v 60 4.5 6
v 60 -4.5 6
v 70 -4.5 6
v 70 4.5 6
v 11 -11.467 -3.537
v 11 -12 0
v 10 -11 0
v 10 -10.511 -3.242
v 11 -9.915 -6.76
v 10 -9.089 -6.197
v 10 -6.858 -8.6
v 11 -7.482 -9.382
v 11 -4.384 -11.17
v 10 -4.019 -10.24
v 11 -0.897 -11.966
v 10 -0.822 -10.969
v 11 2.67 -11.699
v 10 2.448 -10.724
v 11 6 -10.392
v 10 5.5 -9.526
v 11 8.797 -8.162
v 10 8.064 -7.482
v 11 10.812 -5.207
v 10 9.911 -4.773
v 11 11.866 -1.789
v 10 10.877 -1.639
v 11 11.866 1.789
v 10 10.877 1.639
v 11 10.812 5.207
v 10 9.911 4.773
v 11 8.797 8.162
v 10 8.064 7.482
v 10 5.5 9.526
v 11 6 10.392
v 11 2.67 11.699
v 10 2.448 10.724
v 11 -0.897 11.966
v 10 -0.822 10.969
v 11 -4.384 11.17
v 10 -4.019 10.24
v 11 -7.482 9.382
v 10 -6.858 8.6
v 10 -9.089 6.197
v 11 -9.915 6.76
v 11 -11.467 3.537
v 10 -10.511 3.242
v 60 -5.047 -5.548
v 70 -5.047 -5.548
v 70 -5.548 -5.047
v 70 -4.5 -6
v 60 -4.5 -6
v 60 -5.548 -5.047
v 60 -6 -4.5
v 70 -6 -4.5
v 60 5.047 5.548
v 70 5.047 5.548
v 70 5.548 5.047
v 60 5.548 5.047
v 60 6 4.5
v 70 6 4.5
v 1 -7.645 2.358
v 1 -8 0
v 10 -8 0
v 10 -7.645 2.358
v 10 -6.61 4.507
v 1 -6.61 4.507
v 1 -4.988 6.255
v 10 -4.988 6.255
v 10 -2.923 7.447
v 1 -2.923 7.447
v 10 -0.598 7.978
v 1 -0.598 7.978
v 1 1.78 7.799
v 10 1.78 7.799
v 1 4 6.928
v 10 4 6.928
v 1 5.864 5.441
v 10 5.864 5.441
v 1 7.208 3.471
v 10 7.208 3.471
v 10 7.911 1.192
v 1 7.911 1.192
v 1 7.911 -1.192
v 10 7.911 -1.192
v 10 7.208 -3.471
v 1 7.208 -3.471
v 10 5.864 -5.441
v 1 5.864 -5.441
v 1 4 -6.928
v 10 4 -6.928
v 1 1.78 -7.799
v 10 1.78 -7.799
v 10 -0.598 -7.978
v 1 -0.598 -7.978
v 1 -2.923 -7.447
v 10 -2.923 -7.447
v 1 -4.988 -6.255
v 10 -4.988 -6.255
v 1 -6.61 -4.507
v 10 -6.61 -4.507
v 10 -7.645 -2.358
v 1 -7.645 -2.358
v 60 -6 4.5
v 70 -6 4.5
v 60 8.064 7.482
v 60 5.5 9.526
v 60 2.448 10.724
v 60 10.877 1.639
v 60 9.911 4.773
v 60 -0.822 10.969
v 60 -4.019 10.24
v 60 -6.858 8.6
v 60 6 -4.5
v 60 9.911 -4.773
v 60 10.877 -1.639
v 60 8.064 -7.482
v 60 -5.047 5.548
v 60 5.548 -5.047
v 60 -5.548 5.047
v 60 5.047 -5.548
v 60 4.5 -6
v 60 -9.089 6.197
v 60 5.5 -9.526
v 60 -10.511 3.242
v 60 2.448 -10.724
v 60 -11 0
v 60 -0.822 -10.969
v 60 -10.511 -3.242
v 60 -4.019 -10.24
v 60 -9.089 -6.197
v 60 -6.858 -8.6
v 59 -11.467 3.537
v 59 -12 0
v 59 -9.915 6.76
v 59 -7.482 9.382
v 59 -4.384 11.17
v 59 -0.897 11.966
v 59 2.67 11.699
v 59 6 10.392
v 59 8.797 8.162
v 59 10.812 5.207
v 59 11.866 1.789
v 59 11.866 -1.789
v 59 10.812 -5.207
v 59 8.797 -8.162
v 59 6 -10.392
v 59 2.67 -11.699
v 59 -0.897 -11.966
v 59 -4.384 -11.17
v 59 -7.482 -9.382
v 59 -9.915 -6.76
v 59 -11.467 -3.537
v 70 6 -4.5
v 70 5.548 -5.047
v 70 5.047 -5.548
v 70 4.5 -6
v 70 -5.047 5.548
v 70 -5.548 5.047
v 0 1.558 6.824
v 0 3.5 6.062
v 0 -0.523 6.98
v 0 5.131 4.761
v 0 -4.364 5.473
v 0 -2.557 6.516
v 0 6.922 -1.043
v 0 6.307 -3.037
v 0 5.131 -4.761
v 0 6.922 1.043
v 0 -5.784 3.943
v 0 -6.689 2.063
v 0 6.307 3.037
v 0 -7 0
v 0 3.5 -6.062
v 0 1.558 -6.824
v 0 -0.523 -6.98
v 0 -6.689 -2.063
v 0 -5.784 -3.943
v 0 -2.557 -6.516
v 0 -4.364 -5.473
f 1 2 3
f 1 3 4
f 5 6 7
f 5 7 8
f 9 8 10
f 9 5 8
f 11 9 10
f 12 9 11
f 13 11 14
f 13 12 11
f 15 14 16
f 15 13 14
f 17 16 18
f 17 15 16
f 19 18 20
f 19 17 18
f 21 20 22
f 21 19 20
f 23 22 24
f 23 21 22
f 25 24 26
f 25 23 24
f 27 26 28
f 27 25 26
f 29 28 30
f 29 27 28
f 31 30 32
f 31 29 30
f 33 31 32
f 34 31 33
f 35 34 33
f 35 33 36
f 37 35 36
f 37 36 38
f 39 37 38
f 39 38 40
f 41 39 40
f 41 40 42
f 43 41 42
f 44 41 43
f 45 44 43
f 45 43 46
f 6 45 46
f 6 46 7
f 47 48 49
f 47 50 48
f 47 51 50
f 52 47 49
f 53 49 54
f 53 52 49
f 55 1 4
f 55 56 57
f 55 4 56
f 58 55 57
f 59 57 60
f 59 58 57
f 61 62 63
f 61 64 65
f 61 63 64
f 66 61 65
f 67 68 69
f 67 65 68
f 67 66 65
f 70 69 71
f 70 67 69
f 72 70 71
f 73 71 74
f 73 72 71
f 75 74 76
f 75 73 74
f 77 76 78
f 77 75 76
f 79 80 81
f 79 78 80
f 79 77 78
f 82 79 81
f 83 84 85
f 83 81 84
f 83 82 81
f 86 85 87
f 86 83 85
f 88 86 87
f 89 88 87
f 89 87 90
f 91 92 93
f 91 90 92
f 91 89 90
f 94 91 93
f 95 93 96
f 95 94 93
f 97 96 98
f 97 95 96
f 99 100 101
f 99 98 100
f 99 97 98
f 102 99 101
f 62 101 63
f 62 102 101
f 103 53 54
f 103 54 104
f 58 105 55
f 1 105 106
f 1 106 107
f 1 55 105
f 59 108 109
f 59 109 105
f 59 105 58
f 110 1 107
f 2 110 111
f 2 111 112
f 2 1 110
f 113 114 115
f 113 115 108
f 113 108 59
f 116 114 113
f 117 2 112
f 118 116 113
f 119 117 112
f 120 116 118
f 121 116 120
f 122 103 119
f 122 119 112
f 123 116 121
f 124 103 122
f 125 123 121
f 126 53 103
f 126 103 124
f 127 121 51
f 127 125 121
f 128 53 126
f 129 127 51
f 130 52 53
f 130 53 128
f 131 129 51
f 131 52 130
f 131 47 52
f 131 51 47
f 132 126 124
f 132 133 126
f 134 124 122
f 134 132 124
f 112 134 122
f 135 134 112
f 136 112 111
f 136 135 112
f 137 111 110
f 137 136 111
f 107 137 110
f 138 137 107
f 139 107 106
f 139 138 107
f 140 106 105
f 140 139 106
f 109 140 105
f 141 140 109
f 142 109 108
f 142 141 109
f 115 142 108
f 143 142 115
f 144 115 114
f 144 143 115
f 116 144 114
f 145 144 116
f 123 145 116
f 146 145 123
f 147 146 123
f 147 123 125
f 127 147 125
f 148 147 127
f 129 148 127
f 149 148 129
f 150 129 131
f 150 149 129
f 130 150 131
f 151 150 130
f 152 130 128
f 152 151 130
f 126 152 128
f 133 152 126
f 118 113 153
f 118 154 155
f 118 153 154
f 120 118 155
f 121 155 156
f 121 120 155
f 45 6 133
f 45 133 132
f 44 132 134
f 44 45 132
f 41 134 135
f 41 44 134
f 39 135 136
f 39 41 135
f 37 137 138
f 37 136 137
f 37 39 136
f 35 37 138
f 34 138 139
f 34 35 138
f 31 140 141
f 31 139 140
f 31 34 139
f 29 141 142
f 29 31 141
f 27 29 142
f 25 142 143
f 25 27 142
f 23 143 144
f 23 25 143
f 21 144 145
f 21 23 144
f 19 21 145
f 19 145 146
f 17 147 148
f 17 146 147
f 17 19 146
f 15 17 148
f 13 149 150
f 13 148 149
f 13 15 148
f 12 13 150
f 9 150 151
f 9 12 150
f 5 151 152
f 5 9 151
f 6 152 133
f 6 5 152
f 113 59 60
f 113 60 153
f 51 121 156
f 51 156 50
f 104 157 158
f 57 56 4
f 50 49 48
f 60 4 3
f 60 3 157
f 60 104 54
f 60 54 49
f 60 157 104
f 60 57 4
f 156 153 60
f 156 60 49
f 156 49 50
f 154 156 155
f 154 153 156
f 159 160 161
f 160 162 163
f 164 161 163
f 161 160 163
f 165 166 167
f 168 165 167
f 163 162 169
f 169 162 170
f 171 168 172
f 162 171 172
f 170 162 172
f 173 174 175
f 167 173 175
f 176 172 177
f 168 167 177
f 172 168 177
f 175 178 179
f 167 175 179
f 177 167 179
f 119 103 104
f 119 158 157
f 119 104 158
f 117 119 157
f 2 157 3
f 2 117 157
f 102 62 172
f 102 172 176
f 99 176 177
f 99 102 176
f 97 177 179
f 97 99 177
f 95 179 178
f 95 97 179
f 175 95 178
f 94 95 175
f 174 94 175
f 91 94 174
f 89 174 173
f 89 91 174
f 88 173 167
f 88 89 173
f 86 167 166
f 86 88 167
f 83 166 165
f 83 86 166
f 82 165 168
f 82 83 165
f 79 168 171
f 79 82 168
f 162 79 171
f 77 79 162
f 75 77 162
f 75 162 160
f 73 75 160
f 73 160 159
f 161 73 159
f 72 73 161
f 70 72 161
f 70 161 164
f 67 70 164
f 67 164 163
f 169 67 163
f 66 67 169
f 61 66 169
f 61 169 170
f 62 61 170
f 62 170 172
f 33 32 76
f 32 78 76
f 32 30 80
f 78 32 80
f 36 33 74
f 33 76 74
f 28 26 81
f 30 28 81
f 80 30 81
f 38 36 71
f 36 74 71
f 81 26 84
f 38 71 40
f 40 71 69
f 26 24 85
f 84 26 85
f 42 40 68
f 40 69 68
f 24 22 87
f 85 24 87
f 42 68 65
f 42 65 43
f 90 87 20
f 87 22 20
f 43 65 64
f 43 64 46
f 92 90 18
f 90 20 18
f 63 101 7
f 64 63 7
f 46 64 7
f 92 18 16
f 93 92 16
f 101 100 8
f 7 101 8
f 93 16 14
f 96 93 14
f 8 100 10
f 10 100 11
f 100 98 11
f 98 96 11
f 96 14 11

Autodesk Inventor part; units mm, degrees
ref_plane "YZ Plane" through (0, 0, 0) normal (1, 0, 0) x (0, 1, 0)
ref_plane "XZ Plane" through (0, 0, 0) normal (0, 1, 0) x (-1, 0, 0)
ref_plane "XY Plane" through (0, 0, 0) normal (0, 0, 1) x (1, 0, 0)
sketch "草图1" plane through (0, 0, 0) normal (0, 0, 1) x (1, 0, 0)
  line L0 (0, 0) -> (10, 0)
  line L1 (10, 0) -> (10, -8)
  line L2 (10, -8) -> (0, -8)
  line L3 (0, -8) -> (0, 0)
  line L4 (10, 0) -> (60, 0)
  line L5 (60, 0) -> (60, -12)
  line L6 (60, -12) -> (10, -12)
  line L7 (10, -12) -> (10, 0)
  dimension "d0" = 10
  dimension "d1" = 8
  dimension "d2" = 50
  dimension "d3" = 12
revolve "旋转1" add sketch "草图1" angle 360 about axis through (10, 0, 0) along (1, 0, 0)
chamfer "倒角1" distance 1 angle 45 1 edges at (60, 12, 0)
chamfer "倒角2" distance 1 angle 45 1 edges at (0, 8, 0)
chamfer "倒角3" distance 1 angle 45 1 edges at (10, 12, 0)
sketch "草图2" plane through (60, 0, 0) normal (1, 0, 0) x (0, 0, -1)
  line L0 (-4.5, 6) -> (4.5, 6)
  line L1 (6, 4.5) -> (6, -4.5)
  line L2 (4.5, -6) -> (-4.5, -6)
  line L3 (-6, -4.5) -> (-6, 4.5)
  line L4 (-6, 6) -> (6, -6) construction
  line L5 (6, 6) -> (-6, -6) construction
  arc A0 (-4.5, 6) -> (-6, 4.5) centre (0, 0) ccw
  arc A1 (-6, -4.5) -> (-4.5, -6) centre (0, 0) ccw
  arc A2 (4.5, -6) -> (6, -4.5) centre (0, 0) ccw
  arc A3 (6, 4.5) -> (4.5, 6) centre (0, 0) ccw
  dimension "d15" = 12
  dimension "d16" = 12
extrude "拉伸1" add sketch "草图2" along normal blind 10
thread "螺纹1" size "M24x3" designation "M24" class "6g" standard "GB Metric profile" length 48
properties part number "10-螺杆" material "不锈钢"
